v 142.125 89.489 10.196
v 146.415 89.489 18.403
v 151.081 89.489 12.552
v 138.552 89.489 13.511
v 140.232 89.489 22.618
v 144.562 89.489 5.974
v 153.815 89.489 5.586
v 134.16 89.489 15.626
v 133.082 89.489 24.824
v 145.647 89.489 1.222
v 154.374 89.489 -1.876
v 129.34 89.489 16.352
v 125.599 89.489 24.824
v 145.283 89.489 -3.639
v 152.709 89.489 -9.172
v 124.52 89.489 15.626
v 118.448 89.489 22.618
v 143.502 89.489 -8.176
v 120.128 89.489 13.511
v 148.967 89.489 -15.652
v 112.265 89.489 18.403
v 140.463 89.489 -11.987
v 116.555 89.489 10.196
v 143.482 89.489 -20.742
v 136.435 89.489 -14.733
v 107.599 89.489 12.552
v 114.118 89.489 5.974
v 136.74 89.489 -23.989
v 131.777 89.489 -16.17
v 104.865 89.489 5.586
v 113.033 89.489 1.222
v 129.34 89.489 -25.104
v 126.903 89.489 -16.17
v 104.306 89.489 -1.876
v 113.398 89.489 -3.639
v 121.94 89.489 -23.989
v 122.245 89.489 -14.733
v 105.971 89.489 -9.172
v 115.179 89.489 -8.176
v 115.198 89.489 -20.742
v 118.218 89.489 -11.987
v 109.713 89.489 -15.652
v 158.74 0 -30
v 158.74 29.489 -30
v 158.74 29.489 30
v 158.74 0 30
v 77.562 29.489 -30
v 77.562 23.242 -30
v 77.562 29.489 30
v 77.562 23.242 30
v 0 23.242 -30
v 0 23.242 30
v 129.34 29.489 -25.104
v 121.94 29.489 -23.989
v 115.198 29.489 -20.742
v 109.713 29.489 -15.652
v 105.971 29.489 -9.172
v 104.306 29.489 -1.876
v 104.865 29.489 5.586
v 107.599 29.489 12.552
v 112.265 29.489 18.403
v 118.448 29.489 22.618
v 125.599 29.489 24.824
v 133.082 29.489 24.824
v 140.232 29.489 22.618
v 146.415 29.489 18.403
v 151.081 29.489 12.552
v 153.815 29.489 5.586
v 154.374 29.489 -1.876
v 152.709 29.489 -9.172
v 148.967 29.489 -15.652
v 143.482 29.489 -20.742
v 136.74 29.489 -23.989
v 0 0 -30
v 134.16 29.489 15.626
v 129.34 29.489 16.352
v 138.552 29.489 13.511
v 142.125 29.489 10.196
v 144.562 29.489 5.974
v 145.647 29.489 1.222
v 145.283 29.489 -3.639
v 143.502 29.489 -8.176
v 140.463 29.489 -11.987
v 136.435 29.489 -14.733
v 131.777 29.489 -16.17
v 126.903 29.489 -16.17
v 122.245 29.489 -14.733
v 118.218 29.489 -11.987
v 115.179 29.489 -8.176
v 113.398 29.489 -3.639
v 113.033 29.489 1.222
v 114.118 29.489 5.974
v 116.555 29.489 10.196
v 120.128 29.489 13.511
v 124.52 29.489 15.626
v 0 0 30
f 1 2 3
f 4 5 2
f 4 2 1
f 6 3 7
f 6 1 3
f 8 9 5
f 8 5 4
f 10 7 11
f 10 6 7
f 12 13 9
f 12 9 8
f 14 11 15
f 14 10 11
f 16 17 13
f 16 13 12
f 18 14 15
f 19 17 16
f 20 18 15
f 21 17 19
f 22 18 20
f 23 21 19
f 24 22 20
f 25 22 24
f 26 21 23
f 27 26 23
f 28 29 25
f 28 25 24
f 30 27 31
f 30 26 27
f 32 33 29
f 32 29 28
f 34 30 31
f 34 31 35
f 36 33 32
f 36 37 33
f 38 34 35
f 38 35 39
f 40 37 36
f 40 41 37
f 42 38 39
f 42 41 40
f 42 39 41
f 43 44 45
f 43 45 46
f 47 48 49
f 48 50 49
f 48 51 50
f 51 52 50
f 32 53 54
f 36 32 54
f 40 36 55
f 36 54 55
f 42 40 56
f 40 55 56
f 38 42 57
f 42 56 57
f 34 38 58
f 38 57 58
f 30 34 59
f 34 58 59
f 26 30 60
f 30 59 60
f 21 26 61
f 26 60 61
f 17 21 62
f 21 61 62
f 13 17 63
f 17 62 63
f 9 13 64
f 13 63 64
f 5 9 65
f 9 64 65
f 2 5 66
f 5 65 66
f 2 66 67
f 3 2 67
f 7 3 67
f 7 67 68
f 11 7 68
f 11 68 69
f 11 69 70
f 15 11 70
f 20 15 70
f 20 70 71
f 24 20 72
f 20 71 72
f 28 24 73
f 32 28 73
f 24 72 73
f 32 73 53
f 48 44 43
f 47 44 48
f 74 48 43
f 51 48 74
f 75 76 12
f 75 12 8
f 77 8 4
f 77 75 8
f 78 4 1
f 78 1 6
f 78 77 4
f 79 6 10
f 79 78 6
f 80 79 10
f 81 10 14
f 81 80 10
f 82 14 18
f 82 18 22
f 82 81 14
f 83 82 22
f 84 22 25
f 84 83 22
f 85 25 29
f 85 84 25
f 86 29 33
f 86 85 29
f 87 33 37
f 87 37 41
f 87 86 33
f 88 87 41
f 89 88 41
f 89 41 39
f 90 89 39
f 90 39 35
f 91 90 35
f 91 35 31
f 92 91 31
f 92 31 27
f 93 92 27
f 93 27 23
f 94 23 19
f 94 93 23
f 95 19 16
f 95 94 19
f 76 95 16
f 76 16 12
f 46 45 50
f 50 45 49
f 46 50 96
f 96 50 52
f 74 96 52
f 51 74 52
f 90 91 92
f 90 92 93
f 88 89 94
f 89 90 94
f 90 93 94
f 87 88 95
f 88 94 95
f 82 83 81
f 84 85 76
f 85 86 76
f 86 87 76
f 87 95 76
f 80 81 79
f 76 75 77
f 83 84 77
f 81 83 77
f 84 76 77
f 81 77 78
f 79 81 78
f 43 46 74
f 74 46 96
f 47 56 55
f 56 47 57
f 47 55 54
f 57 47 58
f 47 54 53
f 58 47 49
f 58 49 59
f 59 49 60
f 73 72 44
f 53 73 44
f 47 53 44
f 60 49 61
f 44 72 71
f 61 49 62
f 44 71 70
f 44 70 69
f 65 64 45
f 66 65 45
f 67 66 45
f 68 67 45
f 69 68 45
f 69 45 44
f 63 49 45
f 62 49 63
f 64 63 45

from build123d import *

# Parameters (mm, degrees)
P_IDAT_VYSUNUT_M1_DEPTH = 30
SKICA2_R                = 25.104353528
SKICA2_R_2              = 16.352413197
P_IDAT_VYSUNUT_M2_DEPTH = 60


with BuildPart() as part:
    # Skica1 → Přidat vysunutím1 (new body, symmetric)
    with BuildSketch(Plane.XY):
        Polygon((0, 0), (0, 23.242356394), (77.561836829, 23.242356394), (77.561836829, 29.488625529), (158.739934736, 29.488625529), (158.739934736, 0), align=None)
    extrude(amount=P_IDAT_VYSUNUT_M1_DEPTH, both=True)

    # Skica2 → Přidat vysunutím2 (add)
    with BuildSketch(Plane(origin=(0, 29.488625529, 0), x_dir=(1, 0, 0), z_dir=(0, 1, 0))):
        with Locations(Location((129.340120448, 0, 0), (0, 0, 90))):  # turned: the seam where the file's is
            Circle(SKICA2_R)
        with Locations(Location((129.340120448, 0, 0), (0, 0, 270))):  # turned: the seam where the file's is
            Circle(SKICA2_R_2, mode=Mode.SUBTRACT)
    extrude(amount=P_IDAT_VYSUNUT_M2_DEPTH)


solid = part.part
